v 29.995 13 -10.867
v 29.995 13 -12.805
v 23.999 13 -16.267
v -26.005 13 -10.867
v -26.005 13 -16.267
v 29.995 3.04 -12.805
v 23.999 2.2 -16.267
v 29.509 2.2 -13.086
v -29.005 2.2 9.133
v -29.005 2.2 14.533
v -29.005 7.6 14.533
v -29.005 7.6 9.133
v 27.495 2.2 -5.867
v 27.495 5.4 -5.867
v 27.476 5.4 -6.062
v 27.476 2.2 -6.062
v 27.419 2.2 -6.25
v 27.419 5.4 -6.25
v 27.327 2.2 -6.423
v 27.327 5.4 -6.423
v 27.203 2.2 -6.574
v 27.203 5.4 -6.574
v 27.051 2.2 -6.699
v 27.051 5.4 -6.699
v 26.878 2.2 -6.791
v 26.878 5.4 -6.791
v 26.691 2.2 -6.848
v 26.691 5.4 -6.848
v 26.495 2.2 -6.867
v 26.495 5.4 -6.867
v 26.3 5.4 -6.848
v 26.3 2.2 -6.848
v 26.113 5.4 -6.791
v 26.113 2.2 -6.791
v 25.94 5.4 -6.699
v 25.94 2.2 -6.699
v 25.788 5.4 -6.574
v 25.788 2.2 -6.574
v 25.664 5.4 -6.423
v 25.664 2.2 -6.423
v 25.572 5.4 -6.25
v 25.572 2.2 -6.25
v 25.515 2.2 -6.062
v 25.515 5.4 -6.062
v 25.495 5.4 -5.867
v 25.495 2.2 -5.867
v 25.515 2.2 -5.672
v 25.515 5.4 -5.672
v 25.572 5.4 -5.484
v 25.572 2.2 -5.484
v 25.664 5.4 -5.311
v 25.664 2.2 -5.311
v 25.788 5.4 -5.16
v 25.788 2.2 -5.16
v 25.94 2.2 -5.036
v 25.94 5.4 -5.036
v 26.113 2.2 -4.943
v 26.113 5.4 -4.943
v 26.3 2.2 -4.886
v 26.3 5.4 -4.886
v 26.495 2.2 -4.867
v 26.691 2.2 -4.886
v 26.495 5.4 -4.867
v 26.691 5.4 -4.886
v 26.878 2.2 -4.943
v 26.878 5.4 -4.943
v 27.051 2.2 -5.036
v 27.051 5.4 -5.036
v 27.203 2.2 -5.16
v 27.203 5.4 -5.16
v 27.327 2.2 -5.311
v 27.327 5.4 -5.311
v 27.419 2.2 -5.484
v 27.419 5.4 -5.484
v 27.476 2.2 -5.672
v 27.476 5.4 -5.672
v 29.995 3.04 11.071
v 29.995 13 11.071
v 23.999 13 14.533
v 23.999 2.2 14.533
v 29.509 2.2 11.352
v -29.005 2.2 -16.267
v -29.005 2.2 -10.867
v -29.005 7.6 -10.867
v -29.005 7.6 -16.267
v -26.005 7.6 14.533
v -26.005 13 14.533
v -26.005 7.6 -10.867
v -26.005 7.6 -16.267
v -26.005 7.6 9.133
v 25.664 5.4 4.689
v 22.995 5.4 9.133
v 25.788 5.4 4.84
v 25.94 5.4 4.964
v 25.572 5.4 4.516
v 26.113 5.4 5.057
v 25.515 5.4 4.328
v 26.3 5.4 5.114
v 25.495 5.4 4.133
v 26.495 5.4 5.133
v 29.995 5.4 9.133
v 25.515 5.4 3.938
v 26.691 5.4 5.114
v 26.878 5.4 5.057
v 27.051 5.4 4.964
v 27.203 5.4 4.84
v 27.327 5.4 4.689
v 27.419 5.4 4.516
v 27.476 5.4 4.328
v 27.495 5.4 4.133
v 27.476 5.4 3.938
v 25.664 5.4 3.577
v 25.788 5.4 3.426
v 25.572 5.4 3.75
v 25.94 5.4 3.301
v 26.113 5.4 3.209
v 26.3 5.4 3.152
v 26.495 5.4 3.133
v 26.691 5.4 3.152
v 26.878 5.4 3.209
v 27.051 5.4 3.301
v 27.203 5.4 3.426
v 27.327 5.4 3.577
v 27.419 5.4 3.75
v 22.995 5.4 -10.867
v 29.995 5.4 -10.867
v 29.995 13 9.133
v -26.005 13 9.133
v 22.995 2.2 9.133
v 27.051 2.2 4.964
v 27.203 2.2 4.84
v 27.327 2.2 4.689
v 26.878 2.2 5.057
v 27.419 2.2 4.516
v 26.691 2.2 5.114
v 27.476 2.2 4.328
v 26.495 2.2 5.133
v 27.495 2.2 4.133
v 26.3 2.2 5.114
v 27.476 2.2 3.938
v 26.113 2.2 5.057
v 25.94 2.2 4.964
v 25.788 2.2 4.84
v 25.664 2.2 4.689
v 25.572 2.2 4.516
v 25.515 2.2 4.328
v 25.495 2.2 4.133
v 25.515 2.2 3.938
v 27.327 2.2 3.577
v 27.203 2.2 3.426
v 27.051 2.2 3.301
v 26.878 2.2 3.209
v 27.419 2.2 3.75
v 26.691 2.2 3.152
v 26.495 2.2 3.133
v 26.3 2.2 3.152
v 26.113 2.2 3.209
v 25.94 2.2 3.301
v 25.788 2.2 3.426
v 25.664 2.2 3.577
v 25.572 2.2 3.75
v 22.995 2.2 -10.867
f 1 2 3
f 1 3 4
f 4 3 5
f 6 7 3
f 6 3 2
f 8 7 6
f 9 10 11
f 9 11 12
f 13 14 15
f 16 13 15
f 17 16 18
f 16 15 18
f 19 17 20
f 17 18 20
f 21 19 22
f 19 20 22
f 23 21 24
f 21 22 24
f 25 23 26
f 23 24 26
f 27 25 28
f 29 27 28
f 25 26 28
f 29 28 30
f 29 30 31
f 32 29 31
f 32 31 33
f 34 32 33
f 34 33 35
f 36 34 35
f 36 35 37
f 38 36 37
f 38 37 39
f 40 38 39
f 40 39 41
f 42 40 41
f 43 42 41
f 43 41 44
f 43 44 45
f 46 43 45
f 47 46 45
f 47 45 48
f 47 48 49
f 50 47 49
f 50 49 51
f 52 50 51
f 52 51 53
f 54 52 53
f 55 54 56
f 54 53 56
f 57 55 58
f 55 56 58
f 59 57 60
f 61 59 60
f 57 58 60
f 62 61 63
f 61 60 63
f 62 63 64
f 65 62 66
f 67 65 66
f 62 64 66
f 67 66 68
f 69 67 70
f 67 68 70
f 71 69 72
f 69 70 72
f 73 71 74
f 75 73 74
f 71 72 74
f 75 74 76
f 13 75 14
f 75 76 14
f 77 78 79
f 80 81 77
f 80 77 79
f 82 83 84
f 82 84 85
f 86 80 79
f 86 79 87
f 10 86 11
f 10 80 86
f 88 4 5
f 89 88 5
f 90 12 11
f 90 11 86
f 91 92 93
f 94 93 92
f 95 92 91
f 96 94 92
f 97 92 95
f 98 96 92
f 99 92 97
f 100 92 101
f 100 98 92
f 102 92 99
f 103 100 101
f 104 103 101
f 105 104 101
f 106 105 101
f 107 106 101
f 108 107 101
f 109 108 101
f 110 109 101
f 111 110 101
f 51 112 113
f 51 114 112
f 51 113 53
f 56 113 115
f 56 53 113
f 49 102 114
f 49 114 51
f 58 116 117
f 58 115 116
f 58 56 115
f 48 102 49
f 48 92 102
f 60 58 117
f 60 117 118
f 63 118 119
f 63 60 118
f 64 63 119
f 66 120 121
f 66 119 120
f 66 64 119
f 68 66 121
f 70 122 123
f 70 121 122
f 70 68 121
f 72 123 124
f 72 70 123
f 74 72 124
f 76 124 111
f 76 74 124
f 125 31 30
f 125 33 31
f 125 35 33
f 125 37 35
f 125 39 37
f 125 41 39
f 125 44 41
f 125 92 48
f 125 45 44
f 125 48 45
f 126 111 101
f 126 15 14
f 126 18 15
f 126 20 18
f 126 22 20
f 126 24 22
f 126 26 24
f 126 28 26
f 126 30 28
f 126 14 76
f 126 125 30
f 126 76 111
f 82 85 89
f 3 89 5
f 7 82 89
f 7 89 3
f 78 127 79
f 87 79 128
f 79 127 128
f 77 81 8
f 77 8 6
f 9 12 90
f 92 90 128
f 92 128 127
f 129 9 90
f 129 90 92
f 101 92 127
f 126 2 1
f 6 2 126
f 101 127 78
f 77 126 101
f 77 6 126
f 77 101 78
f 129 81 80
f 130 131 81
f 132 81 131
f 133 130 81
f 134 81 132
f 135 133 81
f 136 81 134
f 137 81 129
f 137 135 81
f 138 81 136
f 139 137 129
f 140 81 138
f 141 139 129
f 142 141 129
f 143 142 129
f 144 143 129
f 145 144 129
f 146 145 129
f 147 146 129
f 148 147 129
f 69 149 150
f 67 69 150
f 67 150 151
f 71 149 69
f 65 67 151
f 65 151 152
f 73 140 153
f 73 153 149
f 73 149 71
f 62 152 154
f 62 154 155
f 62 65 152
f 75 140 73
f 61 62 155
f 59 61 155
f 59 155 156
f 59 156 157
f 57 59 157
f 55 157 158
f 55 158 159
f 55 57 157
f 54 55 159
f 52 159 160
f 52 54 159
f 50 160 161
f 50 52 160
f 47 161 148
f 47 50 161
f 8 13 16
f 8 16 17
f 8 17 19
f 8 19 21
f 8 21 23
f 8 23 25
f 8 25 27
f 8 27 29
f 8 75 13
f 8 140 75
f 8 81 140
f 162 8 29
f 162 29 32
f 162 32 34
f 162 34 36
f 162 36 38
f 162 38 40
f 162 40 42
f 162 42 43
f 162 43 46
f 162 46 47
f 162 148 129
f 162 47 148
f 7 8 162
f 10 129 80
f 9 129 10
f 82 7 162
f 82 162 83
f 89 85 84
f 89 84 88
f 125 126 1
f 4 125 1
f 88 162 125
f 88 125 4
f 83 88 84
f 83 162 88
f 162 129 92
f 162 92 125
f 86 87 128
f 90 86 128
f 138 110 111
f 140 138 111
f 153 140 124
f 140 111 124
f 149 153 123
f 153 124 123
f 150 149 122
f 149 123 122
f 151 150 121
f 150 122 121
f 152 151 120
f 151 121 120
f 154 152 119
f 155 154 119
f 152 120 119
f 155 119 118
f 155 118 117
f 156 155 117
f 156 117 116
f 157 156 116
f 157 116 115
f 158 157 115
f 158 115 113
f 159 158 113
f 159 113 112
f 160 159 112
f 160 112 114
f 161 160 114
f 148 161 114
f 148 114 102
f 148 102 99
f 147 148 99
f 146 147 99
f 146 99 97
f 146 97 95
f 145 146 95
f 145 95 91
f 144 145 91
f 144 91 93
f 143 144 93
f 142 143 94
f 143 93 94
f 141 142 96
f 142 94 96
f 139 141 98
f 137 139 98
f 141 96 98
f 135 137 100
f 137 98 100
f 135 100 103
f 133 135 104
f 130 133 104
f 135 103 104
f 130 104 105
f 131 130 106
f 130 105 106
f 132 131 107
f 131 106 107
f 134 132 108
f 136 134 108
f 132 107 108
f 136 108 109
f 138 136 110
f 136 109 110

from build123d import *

# Parameters (mm, degrees)
SALIENTE_EXTRUIR1_DEPTH = 13
CROQUIS2_W              = 7
CROQUIS2_H              = 20
CORTAR_EXTRUIR1_DEPTH   = 7.6
CROQUIS3_W              = 3
CROQUIS3_H              = 5.399999618
CROQUIS3_H_2            = 5.399999619
CORTAR_EXTRUIR2_DEPTH   = 5.4
CROQUIS4_R              = 1
CORTAR_EXTRUIR3_DEPTH   = 10.4
CORTAR_EXTRUIR4_DEPTH   = 32.4
CROQUIS6_W              = 66.642206308
CROQUIS6_H              = 2.2
CORTAR_EXTRUIR5_DEPTH   = 35


with BuildPart() as part:
    # Croquis1 → Saliente-Extruir1 (new body)
    with BuildSketch(Plane(origin=(0, 0, 0), x_dir=(1, 0, 0), z_dir=(0, 1, 0))):
        Polygon((-29.00453802, -14.532941153), (-29.00453802, -9.132941534), (22.99546198, -9.132941534), (22.99546198, 10.867058466), (-29.00453802, 10.867058466), (-29.00453802, 16.267058084), (23.998794118, 16.267058084), (29.99546198, 12.804880808), (29.99546198, -11.070763876), (23.998794118, -14.532941153), align=None)
    extrude(amount=SALIENTE_EXTRUIR1_DEPTH)

    # Croquis2 → Cortar-Extruir1 (cut)
    with BuildSketch(Plane(origin=(0, 13, 0), x_dir=(1, 0, 0), z_dir=(0, 1, 0))):
        with Locations((26.49546198, 0.867058466)):
            Rectangle(CROQUIS2_W, CROQUIS2_H)
    extrude(amount=-CORTAR_EXTRUIR1_DEPTH, mode=Mode.SUBTRACT)

    # Croquis3 → Cortar-Extruir2 (cut)
    with BuildSketch(Plane(origin=(0, 13, 0), x_dir=(1, 0, 0), z_dir=(0, 1, 0))):
        with Locations((-27.50453802, 13.567058275)):
            Rectangle(CROQUIS3_W, CROQUIS3_H)
        with Locations((-27.50453802, -11.832941343)):
            Rectangle(CROQUIS3_W, CROQUIS3_H_2)
    extrude(amount=-CORTAR_EXTRUIR2_DEPTH, mode=Mode.SUBTRACT)

    # Croquis4 → Cortar-Extruir3 (cut)
    with BuildSketch(Plane(origin=(0, 5.4, 0), x_dir=(1, 0, 0), z_dir=(0, 1, 0))):
        with Locations((26.49546198, 5.867058466)):
            Circle(CROQUIS4_R)
        with Locations((26.49546198, -4.132941534)):
            Circle(CROQUIS4_R)
    extrude(amount=-CORTAR_EXTRUIR3_DEPTH, mode=Mode.SUBTRACT)

    # Croquis5 → Cortar-Extruir4 (cut)
    with BuildSketch(Plane.XY.offset(14.532941153)):
        Polygon((28.23546198, 0), (29.99546198, 3.04), (29.99546198, 0), align=None)
    extrude(amount=-CORTAR_EXTRUIR4_DEPTH, mode=Mode.SUBTRACT)

    # Croquis6 → Cortar-Extruir5 (cut)
    with BuildSketch(Plane(origin=(0, 0, -16.267058084), x_dir=(-1, 0, 0), z_dir=(0, 0, -1))):
        with Locations((-4.316565134, 1.1)):
            Rectangle(CROQUIS6_W, CROQUIS6_H)
    extrude(amount=-CORTAR_EXTRUIR5_DEPTH, mode=Mode.SUBTRACT)


solid = part.part
